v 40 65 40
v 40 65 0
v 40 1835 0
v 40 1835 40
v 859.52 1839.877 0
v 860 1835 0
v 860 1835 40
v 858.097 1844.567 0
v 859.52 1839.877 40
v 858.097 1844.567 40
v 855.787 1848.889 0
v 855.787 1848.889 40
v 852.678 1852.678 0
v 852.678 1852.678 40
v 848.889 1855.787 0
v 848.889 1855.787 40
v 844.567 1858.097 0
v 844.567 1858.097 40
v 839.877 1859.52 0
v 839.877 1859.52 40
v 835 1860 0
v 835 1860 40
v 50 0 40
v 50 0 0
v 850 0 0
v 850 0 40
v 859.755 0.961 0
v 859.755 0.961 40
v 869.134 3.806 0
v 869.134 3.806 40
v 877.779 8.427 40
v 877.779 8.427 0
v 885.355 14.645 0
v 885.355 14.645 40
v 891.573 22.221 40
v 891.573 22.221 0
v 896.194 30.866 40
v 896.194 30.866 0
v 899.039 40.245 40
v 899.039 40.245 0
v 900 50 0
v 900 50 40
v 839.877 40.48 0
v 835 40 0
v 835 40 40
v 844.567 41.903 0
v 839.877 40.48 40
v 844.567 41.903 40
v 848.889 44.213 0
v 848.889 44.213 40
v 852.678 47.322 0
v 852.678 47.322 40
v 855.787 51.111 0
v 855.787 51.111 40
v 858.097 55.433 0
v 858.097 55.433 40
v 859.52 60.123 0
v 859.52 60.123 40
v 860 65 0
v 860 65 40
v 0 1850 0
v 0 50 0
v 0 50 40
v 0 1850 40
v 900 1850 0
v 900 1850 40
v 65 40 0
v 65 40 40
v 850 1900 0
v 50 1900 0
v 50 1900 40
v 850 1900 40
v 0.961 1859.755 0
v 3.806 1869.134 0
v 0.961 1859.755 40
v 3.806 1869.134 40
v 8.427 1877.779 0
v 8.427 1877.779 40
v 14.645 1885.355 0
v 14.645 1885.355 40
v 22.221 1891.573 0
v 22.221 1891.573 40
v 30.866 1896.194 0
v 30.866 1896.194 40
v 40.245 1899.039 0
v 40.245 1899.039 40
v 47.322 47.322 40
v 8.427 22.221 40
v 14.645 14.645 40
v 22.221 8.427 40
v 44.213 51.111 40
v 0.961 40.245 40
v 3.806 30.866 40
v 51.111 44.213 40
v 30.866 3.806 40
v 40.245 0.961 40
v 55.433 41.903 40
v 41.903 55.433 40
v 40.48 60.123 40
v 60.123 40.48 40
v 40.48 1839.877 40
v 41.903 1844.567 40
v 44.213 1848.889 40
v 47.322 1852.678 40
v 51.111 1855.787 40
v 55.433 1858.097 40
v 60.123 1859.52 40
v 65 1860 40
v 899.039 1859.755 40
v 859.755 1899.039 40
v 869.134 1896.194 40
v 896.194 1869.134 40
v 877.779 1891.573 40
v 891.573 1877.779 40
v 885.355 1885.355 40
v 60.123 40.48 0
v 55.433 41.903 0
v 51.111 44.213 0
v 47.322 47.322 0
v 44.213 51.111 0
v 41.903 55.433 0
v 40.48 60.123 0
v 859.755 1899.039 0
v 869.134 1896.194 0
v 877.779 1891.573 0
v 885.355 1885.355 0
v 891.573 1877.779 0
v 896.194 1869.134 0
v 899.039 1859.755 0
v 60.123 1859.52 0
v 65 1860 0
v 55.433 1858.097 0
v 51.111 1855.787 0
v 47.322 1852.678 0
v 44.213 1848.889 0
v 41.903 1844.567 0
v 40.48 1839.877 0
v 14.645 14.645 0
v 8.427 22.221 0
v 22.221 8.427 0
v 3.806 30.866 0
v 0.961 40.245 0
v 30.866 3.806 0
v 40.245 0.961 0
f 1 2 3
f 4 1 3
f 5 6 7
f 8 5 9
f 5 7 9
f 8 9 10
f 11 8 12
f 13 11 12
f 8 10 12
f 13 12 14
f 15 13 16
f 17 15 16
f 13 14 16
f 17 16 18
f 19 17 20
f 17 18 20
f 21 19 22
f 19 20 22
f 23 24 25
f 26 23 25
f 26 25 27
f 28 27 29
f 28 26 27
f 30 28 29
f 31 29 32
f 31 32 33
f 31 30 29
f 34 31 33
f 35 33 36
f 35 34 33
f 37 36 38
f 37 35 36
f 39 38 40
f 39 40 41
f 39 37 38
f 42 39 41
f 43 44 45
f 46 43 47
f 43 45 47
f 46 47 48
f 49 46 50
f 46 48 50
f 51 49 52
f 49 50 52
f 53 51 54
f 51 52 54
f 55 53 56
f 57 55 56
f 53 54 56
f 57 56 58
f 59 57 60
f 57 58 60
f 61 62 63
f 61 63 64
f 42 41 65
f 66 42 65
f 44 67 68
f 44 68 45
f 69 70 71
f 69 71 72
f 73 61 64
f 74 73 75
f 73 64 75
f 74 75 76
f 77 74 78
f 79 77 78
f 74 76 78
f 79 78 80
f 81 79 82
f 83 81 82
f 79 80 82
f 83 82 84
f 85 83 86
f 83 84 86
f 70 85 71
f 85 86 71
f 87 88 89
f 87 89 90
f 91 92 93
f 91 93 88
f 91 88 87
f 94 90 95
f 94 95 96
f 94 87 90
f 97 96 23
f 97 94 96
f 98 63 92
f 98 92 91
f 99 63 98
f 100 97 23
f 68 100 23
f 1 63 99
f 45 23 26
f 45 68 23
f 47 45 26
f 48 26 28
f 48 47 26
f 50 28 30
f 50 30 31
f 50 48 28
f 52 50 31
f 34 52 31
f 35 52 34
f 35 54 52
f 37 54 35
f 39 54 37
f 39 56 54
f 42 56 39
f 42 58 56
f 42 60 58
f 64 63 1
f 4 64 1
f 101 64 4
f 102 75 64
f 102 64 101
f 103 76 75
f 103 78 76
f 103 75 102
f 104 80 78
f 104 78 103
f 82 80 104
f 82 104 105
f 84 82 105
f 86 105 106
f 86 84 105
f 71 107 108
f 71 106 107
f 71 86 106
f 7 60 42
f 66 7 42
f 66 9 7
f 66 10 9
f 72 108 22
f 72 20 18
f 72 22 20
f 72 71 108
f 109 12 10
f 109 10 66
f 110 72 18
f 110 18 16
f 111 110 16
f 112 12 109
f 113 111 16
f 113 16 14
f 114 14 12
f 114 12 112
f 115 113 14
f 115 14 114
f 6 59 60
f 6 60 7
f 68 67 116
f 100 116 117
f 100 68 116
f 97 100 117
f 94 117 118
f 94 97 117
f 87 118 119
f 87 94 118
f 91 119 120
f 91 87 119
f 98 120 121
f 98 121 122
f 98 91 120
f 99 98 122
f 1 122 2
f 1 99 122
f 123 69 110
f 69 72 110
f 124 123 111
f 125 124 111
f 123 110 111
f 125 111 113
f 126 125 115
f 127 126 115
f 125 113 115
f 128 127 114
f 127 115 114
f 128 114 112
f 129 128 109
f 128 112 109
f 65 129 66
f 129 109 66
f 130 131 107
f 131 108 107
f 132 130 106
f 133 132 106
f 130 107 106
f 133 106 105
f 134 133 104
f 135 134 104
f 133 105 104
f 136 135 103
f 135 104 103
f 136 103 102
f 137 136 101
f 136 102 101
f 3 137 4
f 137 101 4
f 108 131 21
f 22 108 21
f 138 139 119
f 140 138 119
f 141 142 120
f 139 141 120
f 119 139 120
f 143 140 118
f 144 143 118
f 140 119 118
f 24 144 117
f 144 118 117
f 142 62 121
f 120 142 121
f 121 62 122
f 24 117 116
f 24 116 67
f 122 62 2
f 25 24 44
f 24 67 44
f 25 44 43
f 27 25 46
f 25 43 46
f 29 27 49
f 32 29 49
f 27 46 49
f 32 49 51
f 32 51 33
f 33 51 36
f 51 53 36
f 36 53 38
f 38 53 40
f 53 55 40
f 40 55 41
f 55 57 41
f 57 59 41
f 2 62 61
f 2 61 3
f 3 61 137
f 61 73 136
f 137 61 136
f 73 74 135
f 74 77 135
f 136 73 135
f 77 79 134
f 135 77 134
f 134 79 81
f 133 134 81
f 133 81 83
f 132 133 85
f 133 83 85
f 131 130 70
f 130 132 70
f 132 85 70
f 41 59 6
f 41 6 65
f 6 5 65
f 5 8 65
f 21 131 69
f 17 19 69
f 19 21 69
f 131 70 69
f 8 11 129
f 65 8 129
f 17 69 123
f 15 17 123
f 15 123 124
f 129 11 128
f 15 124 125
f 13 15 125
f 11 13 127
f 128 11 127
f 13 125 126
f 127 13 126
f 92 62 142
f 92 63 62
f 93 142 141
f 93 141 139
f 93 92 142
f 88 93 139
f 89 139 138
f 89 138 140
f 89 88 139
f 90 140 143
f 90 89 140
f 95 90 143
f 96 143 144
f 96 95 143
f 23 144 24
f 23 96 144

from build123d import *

# Parameters (mm, degrees)
ESQUISSE1_W        = 900
ESQUISSE1_H        = 1900
ESQUISSE1_W_2      = 820
ESQUISSE1_H_2      = 1820
BOSS_EXTRU_1_DEPTH = 40
CONG_1_R           = 50
CONG_2_R           = 25


with BuildPart() as part:
    # Esquisse1 → Boss.-Extru.1 (new body)
    with BuildSketch(Plane.XY):
        with Locations((450, 950)):
            Rectangle(ESQUISSE1_W, ESQUISSE1_H)
        with Locations((450, 950)):
            Rectangle(ESQUISSE1_W_2, ESQUISSE1_H_2, mode=Mode.SUBTRACT)
    extrude(amount=BOSS_EXTRU_1_DEPTH)

    # Congé1
    cong_1_edges = [part.edges().sort_by_distance(p)[0] for p in [
        (0, 1900, 20),
        (900, 1900, 20),
        (900, 0, 20),
        (0, 0, 20),
    ]]
    fillet(cong_1_edges, radius=CONG_1_R)

    # Congé2
    cong_2_edges = [part.edges().sort_by_distance(p)[0] for p in [
        (40, 1860, 20),
        (40, 40, 20),
        (860, 40, 20),
        (860, 1860, 20),
    ]]
    fillet(cong_2_edges, radius=CONG_2_R)


solid = part.part
